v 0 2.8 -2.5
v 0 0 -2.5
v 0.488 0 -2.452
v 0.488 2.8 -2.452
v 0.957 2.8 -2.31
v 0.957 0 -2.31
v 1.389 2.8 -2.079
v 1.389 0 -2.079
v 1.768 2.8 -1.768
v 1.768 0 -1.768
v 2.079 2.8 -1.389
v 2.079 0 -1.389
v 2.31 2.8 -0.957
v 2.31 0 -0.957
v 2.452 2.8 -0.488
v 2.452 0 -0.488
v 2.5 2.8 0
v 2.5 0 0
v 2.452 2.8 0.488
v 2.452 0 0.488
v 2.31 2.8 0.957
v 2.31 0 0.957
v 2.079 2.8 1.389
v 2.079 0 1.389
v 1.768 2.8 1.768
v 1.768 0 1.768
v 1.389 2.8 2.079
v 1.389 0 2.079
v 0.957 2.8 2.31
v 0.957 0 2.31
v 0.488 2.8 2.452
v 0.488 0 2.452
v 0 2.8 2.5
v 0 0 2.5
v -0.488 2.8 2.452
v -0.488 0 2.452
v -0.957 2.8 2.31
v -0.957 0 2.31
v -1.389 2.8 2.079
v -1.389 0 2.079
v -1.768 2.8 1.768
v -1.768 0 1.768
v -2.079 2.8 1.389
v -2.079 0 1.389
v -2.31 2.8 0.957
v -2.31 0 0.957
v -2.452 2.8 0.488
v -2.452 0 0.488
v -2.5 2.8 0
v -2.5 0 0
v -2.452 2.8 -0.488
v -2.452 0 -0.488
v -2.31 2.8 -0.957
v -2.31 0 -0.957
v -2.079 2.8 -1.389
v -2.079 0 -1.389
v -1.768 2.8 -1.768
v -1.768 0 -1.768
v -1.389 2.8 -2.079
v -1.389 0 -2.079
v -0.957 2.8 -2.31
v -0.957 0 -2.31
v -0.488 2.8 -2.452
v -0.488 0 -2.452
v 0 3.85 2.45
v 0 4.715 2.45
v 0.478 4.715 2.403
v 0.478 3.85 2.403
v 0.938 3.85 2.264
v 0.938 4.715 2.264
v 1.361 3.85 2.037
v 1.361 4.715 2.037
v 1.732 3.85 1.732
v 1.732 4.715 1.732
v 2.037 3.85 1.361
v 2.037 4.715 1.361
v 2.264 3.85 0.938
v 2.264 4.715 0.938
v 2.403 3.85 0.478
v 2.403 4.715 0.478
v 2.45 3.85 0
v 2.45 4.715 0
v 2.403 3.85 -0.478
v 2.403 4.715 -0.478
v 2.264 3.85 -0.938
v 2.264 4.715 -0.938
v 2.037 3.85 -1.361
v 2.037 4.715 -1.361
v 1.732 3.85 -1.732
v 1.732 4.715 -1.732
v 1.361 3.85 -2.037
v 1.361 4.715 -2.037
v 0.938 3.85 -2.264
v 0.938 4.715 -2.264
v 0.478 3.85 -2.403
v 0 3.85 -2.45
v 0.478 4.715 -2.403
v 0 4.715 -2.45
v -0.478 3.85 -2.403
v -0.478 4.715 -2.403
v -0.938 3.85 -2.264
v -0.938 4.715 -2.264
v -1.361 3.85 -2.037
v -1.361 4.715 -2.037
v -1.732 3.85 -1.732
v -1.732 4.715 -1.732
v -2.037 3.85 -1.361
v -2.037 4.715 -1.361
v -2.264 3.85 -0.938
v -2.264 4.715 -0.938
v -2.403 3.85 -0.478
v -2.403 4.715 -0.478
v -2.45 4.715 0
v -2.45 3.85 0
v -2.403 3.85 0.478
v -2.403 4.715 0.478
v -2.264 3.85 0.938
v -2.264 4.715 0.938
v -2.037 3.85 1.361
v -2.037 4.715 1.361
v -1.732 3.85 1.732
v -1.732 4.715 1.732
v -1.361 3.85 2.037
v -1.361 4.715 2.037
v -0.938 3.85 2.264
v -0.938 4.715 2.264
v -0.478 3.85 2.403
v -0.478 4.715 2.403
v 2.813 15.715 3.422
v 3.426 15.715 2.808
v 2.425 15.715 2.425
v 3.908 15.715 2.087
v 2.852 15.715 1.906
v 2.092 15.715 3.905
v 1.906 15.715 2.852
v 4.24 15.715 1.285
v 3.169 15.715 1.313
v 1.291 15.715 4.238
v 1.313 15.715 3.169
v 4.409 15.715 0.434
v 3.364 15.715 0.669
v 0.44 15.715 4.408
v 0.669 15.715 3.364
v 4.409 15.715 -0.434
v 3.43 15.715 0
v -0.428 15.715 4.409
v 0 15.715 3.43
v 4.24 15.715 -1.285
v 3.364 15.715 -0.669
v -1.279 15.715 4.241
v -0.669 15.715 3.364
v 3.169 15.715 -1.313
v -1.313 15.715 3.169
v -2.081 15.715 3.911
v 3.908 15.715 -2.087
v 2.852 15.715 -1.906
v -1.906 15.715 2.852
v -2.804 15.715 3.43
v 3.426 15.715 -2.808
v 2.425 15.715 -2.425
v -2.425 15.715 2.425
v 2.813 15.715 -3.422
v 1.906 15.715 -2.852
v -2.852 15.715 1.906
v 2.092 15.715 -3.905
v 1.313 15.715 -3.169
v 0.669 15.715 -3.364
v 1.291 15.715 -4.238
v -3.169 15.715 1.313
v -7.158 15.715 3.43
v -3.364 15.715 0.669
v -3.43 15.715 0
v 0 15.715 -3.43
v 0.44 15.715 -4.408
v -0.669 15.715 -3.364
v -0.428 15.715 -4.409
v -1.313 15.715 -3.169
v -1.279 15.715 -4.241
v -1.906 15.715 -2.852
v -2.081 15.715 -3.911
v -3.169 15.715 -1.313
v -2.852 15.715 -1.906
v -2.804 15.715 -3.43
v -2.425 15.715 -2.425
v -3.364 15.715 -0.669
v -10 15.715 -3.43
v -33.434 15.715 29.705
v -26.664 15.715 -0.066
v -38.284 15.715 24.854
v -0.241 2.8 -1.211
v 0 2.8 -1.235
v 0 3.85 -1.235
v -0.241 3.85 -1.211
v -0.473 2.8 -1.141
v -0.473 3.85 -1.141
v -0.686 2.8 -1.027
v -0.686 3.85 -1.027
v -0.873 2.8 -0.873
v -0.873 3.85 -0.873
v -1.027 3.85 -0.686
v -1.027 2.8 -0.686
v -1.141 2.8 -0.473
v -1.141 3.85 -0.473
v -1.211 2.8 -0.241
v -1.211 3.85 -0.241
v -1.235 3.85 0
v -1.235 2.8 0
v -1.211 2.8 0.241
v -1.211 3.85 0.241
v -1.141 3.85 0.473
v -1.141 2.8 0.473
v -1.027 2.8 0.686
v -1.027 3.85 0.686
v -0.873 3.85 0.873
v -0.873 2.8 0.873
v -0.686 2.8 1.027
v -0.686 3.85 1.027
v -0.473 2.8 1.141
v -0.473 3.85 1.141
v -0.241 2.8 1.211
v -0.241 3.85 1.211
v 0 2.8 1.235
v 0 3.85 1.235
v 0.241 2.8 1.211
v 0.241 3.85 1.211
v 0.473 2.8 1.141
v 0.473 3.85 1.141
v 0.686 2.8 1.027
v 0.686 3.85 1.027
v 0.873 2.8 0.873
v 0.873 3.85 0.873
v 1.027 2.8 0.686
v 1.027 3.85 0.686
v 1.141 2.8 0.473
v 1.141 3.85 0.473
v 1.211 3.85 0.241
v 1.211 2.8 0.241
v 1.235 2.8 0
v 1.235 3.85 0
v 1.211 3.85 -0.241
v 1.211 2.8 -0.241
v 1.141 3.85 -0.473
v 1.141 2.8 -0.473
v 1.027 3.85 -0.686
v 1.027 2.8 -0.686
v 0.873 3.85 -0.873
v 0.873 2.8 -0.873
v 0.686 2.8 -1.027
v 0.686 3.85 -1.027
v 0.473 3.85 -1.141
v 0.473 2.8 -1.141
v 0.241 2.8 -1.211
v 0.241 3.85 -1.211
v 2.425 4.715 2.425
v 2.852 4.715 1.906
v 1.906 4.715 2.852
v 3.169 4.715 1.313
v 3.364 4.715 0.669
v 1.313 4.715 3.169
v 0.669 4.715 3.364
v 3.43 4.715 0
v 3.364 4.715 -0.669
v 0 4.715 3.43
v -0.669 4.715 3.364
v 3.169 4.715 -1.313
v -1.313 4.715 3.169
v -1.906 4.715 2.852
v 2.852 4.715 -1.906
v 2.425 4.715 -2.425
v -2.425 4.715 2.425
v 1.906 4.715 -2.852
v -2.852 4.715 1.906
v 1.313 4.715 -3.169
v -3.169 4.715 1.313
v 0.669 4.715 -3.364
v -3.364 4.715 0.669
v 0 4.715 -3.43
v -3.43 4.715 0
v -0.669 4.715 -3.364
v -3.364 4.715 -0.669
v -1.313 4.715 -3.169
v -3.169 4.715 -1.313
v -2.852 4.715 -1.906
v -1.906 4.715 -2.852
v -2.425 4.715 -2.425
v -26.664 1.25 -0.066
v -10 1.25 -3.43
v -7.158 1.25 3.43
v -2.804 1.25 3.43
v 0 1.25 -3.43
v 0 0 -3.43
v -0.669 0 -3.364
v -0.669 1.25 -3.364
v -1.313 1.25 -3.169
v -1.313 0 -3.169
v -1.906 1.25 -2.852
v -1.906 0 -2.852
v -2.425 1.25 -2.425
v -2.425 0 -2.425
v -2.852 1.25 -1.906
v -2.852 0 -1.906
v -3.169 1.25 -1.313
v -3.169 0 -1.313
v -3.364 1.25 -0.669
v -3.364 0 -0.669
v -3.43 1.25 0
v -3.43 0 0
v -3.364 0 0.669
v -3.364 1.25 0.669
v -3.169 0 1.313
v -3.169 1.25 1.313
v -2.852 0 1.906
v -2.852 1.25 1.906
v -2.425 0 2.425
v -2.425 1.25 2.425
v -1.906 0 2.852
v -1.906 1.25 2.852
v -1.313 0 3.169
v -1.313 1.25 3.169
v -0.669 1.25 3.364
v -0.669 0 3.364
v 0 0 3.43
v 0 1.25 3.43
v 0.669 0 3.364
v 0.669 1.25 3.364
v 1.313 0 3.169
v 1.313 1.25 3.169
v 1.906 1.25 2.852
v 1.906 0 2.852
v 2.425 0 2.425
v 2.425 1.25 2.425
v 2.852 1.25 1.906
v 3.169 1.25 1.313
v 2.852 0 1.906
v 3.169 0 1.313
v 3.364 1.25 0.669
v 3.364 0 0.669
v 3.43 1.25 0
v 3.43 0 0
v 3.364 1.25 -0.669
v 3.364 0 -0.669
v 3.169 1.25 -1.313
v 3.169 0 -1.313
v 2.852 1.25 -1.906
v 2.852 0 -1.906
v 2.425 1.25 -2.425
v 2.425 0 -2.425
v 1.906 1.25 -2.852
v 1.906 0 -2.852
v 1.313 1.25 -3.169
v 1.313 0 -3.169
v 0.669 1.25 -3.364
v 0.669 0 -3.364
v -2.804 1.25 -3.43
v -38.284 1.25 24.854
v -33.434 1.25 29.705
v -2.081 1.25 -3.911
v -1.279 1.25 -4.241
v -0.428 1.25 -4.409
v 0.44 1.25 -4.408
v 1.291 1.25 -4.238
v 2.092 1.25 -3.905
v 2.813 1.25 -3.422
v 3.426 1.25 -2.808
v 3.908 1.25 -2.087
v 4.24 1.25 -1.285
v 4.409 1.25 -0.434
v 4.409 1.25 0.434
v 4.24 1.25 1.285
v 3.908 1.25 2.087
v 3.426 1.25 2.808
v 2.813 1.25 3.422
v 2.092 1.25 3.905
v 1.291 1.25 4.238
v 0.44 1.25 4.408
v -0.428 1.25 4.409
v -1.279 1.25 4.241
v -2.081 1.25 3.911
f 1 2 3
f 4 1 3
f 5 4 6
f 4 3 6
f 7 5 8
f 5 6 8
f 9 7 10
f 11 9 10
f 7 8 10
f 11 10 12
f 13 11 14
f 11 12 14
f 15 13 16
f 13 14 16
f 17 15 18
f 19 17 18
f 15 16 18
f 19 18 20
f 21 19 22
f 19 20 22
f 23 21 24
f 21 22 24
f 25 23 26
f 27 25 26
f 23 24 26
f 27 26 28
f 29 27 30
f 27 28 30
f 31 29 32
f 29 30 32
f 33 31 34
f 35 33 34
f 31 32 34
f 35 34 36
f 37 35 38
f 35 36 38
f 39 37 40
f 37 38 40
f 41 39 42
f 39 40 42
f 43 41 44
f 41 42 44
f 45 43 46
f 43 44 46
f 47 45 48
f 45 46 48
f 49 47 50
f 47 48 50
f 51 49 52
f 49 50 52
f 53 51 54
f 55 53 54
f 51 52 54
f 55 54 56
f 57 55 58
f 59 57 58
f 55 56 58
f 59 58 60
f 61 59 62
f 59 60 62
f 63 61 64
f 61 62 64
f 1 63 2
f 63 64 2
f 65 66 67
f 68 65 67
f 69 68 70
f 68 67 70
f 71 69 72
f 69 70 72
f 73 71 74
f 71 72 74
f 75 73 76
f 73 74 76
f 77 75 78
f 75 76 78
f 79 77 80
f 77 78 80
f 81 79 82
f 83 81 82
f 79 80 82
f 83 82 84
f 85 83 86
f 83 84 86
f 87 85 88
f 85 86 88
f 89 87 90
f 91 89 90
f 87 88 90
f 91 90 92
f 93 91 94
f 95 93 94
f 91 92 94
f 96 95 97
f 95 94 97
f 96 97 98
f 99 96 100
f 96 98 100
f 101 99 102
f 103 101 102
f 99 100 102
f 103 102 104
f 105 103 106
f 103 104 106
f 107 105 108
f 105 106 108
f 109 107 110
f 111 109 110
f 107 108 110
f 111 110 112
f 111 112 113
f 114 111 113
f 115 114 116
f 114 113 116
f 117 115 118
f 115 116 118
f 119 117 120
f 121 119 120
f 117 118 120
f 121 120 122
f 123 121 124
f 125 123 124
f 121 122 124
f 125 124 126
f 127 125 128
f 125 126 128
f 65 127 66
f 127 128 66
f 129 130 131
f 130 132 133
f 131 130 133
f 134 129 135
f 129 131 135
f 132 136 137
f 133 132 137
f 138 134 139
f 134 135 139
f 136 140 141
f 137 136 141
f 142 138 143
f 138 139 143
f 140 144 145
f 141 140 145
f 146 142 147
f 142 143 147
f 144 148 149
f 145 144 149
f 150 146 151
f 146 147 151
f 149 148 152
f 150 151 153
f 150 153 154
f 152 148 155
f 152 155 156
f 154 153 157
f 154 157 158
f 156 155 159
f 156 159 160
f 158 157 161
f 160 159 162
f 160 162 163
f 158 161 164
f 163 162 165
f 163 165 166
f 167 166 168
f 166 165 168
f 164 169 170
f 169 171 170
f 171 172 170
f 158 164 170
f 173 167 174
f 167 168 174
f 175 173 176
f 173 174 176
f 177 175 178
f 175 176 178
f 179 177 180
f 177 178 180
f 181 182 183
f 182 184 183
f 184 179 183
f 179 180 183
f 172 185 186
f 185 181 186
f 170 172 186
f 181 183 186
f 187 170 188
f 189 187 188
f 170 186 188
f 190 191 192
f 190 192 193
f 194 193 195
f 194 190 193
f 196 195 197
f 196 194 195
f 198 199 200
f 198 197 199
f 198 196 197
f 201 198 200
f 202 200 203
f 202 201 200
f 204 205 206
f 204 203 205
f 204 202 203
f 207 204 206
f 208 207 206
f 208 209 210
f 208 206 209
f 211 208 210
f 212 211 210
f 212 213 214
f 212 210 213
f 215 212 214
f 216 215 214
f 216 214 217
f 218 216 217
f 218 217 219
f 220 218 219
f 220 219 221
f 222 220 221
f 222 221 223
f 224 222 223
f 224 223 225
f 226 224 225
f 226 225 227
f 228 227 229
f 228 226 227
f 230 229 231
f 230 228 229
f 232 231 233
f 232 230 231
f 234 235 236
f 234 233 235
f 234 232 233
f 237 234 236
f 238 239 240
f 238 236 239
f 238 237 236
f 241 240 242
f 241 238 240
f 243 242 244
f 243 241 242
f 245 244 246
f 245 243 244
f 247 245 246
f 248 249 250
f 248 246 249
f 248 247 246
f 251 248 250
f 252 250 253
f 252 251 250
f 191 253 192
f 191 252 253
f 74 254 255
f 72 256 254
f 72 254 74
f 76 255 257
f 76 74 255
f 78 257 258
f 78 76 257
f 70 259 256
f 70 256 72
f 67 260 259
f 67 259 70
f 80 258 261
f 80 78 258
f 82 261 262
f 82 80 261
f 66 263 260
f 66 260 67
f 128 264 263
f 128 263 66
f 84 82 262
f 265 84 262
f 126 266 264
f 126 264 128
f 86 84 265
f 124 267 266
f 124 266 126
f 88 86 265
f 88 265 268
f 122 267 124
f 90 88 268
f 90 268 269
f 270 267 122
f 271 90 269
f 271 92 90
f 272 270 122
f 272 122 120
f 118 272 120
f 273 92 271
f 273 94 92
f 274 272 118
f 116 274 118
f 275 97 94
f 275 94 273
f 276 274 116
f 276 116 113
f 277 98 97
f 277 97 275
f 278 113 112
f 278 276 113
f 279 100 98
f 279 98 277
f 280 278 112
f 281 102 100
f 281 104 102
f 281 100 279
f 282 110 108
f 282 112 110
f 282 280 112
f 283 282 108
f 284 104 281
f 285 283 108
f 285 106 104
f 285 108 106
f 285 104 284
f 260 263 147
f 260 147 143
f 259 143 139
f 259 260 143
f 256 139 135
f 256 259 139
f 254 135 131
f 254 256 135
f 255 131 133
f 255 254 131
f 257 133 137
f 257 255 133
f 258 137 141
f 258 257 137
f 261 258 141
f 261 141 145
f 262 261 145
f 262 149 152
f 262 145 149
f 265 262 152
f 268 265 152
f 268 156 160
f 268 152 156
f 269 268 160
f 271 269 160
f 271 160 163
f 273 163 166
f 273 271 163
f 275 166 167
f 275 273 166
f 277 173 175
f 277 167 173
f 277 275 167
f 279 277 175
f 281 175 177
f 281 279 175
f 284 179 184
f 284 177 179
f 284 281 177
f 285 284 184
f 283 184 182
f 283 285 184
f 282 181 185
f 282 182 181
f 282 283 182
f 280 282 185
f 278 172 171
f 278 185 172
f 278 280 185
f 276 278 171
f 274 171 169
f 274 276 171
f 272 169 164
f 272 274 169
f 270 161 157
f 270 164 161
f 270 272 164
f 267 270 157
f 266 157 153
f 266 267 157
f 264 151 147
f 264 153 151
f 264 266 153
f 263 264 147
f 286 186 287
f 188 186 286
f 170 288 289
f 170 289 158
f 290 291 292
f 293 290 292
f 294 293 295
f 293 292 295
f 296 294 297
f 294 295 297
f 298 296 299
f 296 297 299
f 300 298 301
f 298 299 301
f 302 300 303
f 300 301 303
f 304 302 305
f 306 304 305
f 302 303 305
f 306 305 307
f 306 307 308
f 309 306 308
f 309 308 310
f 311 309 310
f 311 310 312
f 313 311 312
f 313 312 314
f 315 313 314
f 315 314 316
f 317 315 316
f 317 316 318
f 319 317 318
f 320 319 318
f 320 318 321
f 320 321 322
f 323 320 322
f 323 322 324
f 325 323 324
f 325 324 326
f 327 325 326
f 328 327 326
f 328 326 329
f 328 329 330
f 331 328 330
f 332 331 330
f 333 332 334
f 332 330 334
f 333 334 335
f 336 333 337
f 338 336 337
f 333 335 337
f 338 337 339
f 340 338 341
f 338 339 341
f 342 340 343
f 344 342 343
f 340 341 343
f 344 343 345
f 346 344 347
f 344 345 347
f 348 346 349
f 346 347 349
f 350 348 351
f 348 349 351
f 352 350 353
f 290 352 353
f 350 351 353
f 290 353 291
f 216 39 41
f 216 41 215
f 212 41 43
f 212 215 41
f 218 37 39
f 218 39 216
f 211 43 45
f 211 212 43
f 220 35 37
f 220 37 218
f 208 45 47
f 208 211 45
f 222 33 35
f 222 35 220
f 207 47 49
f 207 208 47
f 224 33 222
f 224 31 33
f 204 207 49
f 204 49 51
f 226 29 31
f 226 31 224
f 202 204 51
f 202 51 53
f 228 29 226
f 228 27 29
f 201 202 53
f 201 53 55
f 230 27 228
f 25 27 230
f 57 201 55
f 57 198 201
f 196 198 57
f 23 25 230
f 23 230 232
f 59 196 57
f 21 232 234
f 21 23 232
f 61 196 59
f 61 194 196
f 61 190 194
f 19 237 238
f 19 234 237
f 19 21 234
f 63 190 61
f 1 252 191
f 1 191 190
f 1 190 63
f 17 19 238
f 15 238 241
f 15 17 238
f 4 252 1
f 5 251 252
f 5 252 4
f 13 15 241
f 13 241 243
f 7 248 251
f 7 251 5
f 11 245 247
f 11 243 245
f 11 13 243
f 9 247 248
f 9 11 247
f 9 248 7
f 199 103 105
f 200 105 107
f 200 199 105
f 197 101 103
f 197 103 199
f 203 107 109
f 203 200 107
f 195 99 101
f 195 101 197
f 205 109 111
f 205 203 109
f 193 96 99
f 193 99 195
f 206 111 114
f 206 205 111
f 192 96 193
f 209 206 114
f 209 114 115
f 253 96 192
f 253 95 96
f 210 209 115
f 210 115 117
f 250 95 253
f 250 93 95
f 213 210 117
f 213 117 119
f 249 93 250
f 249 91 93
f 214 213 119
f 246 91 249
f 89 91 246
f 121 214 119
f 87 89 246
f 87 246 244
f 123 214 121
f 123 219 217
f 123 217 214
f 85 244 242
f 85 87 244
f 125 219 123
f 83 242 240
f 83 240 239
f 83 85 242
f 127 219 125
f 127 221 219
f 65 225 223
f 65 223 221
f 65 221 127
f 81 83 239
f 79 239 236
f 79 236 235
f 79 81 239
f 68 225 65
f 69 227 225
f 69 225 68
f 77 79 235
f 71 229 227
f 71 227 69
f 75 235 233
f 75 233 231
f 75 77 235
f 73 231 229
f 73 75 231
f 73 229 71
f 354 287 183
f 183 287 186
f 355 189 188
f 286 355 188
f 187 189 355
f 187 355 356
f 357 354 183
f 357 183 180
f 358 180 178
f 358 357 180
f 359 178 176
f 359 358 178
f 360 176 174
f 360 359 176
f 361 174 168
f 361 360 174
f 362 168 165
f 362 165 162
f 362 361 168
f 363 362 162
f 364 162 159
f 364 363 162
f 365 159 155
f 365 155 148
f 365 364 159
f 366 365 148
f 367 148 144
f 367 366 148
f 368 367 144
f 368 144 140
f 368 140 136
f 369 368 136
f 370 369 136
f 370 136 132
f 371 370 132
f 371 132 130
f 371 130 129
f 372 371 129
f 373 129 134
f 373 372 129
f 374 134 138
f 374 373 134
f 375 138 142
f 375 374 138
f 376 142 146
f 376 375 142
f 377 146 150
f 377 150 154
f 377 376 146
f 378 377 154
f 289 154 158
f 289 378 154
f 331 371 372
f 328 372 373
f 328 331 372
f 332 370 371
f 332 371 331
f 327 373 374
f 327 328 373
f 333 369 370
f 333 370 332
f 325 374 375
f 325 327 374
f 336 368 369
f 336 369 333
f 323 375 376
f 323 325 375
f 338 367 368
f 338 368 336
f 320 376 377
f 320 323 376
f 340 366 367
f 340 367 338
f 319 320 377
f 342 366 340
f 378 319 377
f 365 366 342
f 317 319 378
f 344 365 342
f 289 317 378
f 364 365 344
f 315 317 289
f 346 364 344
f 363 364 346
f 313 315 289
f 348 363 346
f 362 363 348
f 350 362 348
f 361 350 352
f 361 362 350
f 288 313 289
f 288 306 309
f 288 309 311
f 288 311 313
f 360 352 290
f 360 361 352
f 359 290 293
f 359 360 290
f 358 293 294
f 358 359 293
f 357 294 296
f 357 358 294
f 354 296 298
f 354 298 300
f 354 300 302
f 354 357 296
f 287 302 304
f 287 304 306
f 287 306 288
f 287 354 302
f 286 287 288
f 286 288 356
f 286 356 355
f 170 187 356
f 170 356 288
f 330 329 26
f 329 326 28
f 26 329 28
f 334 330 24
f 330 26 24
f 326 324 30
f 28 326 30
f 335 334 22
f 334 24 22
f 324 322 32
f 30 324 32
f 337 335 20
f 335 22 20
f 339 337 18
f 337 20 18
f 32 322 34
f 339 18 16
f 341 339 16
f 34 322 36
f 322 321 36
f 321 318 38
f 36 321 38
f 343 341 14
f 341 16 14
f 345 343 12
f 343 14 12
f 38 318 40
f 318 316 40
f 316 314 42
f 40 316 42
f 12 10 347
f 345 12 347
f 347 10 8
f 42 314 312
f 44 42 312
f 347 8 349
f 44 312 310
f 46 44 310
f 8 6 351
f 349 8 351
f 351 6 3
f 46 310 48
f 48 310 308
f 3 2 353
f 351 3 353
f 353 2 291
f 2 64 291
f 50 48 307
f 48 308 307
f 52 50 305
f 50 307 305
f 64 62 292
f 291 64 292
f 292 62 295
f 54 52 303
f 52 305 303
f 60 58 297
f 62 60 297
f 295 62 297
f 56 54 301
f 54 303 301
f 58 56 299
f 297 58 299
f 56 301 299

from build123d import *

# Parameters (mm, degrees)
SKETCH1_R            = 3.43
SKETCH1_R_2          = 1.235
MAIN_BODY_DEPTH      = 4.715
SKETCH2_R            = 2.45
TOP_SCREW_HOLE_DEPTH = 0.865
MAKE_START           = -3.465
MAKE_WINGS_DEPTH     = 14.465
SKETCH4_R            = 2.5
SPLINE_HOLE_DEPTH    = 2.8
SKETCH5_W            = 6.86
SKETCH5_H            = 14.465
BOSS_EXTRUDE1_DEPTH  = 5
BOSS_EXTRUDE2_DEPTH  = 14.465
BOSS_EXTRUDE3_DEPTH  = 14.465
BOSS_EXTRUDE4_START  = -14.465
BOSS_EXTRUDE4_DEPTH  = 14.465
CUT_EXTRUDE1_DEPTH   = 51.941486893


with BuildPart() as part:
    # Sketch1 → main body (new body)
    with BuildSketch(Plane(origin=(0, 0, 0), x_dir=(1, 0, 0), z_dir=(0, 1, 0))):
        with Locations(Location((0, 0, 0), (0, 0, 90))):
            Circle(SKETCH1_R)
        with Locations(Location((0, 0, 0), (0, 0, 90))):
            Circle(SKETCH1_R_2, mode=Mode.SUBTRACT)
    extrude(amount=MAIN_BODY_DEPTH)

    # Sketch2 → top screw hole (cut)
    with BuildSketch(Plane(origin=(0, 4.715, 0), x_dir=(1, 0, 0), z_dir=(0, 1, 0))):
        with Locations(Location((0, 0, 0), (0, 0, 270))):
            Circle(SKETCH2_R)
    extrude(amount=-TOP_SCREW_HOLE_DEPTH, mode=Mode.SUBTRACT)

    # Sketch3 → make wings (add)
    with BuildSketch(Plane(origin=(0, 4.715, 0), x_dir=(1, 0, 0), z_dir=(0, 1, 0)).offset(MAKE_START)):
        with BuildLine():
            ThreePointArc((0, -3.43), (-3.43, 0), (0, 3.43))
            Line((0, 3.43), (-6.57, 3.43))
            ThreePointArc((-6.57, 3.43), (-10, 0), (-6.57, -3.43))
            Line((-6.57, -3.43), (0, -3.43))
        make_face()
    extrude(amount=MAKE_WINGS_DEPTH)

    # Sketch4 → spline hole (cut)
    with BuildSketch(Plane.XZ):
        with Locations(Location((0, 0, 0), (0, 0, 270))):
            Circle(SKETCH4_R)
    extrude(amount=-SPLINE_HOLE_DEPTH, mode=Mode.SUBTRACT)

    # Sketch5 → Boss-Extrude1 (add)
    with BuildSketch(Plane.ZY.offset(10)):
        with Locations((0, 8.4825)):
            Rectangle(SKETCH5_W, SKETCH5_H)
    extrude(amount=-BOSS_EXTRUDE1_DEPTH)

    # Sketch6 → Boss-Extrude2 (add)
    with BuildSketch(Plane(origin=(0, 15.715, 0), x_dir=(1, 0, 0), z_dir=(0, 1, 0))):
        Polygon((-10, 3.43), (-38.284271247, -24.854271247), (-33.433518729, -29.705023766), (-5.149247481, -1.420752519), align=None)
    extrude(amount=-BOSS_EXTRUDE2_DEPTH)

    # Sketch7 → Boss-Extrude3 (add)
    with BuildSketch(Plane(origin=(0, 15.715, 0), x_dir=(1, 0, 0), z_dir=(0, 1, 0))):
        Polygon((-38.284271247, -24.854271247), (-20.294632832, 13.724632832), (-10, 3.43), align=None)
    extrude(amount=-BOSS_EXTRUDE3_DEPTH)

    # Sketch9 → Boss-Extrude4 (add)
    with BuildSketch(Plane(origin=(0, 15.715, 0), x_dir=(1, 0, 0), z_dir=(0, 1, 0)).offset(BOSS_EXTRUDE4_START)):
        with BuildLine():
            Line((0, 3.43), (-2.803569154, 3.43))
            ThreePointArc((-2.803569154, 3.43), (4.43, 0), (-2.803569154, -3.43))
            Line((-2.803569154, -3.43), (0, -3.43))
            ThreePointArc((0, -3.43), (3.43, 0), (0, 3.43))
        make_face()
    extrude(amount=BOSS_EXTRUDE4_DEPTH)

    # Sketch10 → Cut-Extrude1 (cut, through all)
    with BuildSketch(Plane(origin=(0, 15.715, 0), x_dir=(1, 0, 0), z_dir=(0, 1, 0))):
        Polygon((-10, 3.43), (-26.663813955, 0.065879836), (-20.294632832, 13.724632832), align=None)
    extrude(amount=-CUT_EXTRUDE1_DEPTH, mode=Mode.SUBTRACT)


solid = part.part
